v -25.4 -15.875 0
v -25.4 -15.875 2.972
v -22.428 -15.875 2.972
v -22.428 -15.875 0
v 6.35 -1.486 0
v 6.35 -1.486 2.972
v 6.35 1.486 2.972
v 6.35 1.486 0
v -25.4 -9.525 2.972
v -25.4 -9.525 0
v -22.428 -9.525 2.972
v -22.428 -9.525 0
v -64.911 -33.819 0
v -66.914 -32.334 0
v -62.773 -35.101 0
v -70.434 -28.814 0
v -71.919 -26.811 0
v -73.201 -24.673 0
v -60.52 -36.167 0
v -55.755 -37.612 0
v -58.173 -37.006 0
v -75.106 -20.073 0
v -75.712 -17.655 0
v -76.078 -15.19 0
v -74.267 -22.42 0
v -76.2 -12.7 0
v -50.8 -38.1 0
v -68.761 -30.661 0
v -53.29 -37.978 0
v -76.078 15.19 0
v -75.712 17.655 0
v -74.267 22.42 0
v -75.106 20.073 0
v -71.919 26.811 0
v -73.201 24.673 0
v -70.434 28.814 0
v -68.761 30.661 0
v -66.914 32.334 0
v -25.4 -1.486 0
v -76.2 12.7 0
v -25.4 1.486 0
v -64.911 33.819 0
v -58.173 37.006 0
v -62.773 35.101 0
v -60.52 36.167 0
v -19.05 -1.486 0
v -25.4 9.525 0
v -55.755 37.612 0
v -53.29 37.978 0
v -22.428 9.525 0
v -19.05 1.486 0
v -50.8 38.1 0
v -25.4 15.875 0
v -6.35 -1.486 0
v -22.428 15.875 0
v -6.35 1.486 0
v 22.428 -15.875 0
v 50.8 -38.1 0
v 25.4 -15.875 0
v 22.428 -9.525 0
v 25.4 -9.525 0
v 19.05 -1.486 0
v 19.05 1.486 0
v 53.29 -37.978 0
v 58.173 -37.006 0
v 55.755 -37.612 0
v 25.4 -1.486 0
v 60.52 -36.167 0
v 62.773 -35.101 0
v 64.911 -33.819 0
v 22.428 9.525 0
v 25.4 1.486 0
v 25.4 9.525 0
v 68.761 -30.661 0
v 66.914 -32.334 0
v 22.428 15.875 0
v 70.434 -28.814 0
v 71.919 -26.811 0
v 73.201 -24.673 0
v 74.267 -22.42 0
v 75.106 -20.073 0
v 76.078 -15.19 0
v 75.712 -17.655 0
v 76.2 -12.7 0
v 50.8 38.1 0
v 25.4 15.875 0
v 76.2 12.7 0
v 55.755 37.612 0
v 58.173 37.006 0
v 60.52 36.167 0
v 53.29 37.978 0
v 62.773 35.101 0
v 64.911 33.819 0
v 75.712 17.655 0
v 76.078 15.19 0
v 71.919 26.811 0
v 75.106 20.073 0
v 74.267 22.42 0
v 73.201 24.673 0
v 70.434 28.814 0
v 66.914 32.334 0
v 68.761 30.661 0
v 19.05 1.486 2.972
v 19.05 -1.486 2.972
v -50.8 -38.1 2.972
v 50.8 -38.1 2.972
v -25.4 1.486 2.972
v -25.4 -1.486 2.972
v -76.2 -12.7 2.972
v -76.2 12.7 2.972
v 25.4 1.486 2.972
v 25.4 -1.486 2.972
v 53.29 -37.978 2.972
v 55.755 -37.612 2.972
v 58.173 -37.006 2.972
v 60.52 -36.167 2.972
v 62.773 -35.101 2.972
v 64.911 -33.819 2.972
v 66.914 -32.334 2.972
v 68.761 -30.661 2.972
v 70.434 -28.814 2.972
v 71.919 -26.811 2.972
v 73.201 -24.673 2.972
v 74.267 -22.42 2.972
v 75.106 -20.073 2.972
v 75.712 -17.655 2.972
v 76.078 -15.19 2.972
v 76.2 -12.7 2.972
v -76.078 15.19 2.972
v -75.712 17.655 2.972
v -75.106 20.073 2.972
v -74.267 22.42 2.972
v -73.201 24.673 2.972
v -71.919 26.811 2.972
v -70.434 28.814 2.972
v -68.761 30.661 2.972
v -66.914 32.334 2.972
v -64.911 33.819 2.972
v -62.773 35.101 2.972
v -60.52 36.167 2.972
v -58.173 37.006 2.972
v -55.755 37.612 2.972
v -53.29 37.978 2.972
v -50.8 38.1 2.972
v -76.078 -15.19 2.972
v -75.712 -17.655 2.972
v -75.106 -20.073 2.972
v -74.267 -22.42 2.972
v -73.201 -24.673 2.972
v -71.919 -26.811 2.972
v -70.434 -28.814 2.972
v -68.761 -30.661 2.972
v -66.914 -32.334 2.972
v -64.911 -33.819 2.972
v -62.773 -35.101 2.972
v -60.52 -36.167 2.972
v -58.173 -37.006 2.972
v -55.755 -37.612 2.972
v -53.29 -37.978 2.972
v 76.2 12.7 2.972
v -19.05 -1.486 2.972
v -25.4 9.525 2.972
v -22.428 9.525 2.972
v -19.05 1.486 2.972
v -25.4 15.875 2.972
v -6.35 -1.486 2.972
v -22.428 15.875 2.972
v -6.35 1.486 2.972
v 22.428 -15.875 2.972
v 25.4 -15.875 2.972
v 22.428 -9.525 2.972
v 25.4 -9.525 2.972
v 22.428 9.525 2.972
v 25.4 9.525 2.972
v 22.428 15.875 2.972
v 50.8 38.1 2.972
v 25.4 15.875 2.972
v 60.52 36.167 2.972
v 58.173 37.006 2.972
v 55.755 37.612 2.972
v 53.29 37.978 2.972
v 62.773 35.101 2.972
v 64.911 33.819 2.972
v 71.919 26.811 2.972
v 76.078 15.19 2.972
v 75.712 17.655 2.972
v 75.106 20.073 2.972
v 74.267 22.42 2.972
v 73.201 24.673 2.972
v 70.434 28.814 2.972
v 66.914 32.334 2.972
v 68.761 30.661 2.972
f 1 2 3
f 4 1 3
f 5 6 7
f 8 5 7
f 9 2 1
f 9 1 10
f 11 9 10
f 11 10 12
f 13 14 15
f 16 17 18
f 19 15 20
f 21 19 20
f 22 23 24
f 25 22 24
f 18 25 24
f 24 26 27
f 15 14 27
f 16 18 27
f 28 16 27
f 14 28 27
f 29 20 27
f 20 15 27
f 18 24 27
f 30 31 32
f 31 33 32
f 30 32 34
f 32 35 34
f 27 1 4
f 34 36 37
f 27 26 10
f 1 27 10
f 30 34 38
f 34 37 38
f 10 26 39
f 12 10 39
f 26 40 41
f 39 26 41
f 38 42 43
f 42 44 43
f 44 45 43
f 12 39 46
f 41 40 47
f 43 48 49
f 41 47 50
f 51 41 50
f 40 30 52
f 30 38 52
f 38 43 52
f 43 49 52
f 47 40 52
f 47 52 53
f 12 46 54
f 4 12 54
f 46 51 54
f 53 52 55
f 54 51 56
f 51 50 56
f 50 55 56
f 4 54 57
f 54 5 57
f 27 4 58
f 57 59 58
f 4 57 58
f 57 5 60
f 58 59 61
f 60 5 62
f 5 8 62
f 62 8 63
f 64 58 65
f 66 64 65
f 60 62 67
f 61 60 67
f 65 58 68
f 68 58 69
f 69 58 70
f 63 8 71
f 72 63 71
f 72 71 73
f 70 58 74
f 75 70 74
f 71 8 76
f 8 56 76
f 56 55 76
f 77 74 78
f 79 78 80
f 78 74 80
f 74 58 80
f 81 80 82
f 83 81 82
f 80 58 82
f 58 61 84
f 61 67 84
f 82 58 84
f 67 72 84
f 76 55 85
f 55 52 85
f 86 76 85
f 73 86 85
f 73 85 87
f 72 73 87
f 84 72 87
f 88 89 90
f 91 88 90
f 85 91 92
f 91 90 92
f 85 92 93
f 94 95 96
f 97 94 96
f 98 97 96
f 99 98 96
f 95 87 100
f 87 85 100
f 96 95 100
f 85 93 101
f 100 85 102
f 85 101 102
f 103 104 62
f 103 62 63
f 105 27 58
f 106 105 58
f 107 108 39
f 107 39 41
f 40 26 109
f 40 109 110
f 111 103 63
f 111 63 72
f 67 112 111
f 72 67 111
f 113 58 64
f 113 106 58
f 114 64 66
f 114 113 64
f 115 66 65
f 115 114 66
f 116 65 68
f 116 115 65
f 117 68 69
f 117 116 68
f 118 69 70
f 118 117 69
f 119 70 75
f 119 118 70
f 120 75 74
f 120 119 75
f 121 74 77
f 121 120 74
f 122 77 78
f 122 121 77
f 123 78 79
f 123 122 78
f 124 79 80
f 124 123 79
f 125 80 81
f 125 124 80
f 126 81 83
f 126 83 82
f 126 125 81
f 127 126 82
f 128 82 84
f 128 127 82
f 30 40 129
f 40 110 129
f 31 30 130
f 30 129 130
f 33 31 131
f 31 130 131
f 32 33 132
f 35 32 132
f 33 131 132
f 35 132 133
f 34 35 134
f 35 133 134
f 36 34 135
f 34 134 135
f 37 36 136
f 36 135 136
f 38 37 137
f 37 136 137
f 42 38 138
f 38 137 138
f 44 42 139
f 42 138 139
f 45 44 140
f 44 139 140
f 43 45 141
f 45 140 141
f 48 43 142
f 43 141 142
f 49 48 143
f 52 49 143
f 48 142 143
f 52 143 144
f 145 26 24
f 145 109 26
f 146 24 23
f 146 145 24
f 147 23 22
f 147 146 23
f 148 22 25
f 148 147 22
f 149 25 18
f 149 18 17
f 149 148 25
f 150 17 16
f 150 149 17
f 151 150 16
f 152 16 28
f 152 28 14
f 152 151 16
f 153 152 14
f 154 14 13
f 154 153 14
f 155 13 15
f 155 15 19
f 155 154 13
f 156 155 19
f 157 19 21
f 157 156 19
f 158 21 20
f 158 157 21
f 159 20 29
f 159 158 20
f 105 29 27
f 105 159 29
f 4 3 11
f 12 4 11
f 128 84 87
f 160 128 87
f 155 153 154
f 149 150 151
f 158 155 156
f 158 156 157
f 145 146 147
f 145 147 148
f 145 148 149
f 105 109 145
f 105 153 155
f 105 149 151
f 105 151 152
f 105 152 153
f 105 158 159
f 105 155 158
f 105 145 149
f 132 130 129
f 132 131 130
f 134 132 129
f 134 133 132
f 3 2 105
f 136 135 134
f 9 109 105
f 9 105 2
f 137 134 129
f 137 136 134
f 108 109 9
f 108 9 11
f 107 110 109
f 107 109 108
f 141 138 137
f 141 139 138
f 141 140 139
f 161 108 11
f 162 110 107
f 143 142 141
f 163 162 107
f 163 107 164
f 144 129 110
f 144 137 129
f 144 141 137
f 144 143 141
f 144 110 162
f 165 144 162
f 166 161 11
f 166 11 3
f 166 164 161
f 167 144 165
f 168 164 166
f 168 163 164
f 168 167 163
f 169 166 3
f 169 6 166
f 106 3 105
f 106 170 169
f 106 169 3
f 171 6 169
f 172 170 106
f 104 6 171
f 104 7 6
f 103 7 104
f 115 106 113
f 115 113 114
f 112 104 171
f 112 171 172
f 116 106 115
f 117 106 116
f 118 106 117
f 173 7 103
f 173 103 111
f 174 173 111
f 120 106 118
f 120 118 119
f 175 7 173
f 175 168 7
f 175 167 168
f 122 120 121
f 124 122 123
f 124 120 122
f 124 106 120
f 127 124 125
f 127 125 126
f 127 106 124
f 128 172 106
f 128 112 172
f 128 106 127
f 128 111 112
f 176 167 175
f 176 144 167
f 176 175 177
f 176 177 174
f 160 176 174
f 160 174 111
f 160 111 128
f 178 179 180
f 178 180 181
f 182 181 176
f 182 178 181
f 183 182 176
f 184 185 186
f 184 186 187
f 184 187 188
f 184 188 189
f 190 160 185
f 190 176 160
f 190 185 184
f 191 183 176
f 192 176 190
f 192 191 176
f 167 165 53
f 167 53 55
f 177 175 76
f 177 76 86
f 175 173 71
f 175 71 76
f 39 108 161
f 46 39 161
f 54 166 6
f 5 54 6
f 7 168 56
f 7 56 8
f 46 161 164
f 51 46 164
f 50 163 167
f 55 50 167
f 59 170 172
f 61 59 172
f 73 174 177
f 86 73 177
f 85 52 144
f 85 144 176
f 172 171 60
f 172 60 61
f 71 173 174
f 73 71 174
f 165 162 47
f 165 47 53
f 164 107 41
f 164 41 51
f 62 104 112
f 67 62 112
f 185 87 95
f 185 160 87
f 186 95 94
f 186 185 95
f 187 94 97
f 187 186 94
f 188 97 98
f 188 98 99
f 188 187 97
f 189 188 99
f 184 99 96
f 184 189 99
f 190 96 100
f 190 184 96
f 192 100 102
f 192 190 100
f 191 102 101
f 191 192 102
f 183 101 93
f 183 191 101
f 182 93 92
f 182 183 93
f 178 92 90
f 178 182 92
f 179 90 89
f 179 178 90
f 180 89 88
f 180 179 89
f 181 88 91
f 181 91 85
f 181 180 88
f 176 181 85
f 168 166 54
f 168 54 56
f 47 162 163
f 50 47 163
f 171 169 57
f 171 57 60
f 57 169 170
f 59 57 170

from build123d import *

# Parameters (mm, degrees)
F0_W     = 152.4
F0_H     = 76.2
F1_DEPTH = 2.9718
F2_R     = 25.4
F3_W     = 12.7
F3_H     = 2.9718
F3_W_2   = 6.35
F4_DEPTH = 25.4
F5_W     = 2.9718
F5_H     = 6.35
F6_DEPTH = 25.4


with BuildPart() as f1:
    # F0 (on Top) → F1 (new body)
    with BuildSketch(Plane.XY):
        Rectangle(F0_W, F0_H)
    extrude(amount=F1_DEPTH)

    # F2
    f2_edges = [f1.edges().sort_by_distance(p)[0] for p in [
        (-76.2, -38.1, 1.4859),
        (76.2, -38.1, 1.4859),
        (76.2, 38.1, 1.4859),
        (-76.2, 38.1, 1.4859),
    ]]
    fillet(f2_edges, radius=F2_R)

    # F3 (on face) → F4 (cut)
    with BuildSketch(Plane.XY.offset(2.9718)):
        Rectangle(F3_W, F3_H)
        with Locations((22.225, 0)):
            Rectangle(F3_W_2, F3_H)
        with Locations((-22.225, 0)):
            Rectangle(F3_W_2, F3_H)
    extrude(amount=-F4_DEPTH, mode=Mode.SUBTRACT)

    # F5 (on face) → F6 (cut)
    with BuildSketch(Plane.XY.offset(2.9718)):
        with Locations((23.9141, 12.7)):
            Rectangle(F5_W, F5_H)
        with Locations((23.9141, -12.7)):
            Rectangle(F5_W, F5_H)
        with Locations((-23.9141, 12.7)):
            Rectangle(F5_W, F5_H)
        with Locations((-23.9141, -12.7)):
            Rectangle(F5_W, F5_H)
    extrude(amount=-F6_DEPTH, mode=Mode.SUBTRACT)


solid = f1.part
